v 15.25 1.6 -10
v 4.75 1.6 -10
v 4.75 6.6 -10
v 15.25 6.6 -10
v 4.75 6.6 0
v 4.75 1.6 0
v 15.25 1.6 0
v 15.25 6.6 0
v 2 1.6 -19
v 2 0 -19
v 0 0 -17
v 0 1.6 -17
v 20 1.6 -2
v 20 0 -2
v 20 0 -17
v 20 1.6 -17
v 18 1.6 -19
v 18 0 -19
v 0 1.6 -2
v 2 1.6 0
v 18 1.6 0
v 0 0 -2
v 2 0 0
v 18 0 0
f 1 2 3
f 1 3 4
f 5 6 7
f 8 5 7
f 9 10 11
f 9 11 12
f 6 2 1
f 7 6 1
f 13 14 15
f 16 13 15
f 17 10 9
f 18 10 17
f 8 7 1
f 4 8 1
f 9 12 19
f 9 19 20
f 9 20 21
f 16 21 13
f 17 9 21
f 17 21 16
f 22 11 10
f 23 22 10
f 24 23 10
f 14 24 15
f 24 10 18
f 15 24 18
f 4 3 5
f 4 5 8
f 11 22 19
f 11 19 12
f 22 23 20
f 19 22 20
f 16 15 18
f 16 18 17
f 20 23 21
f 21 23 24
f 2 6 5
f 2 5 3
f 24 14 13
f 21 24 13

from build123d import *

# Parameters (mm, degrees)
SKETCH1_W           = 20
SKETCH1_H           = 19
BOSS_EXTRUDE1_DEPTH = 1.6
CHAMFER1_SIZE       = 2
SKETCH2_W           = 10.5
SKETCH2_H           = 10
BOSS_EXTRUDE2_DEPTH = 5


with BuildPart() as part:
    # Sketch1 → Boss-Extrude1 (new body)
    with BuildSketch(Plane(origin=(0, 0, 0), x_dir=(1, 0, 0), z_dir=(0, 1, 0))):
        with Locations((10, 9.5)):
            Rectangle(SKETCH1_W, SKETCH1_H)
    extrude(amount=BOSS_EXTRUDE1_DEPTH)

    # Chamfer1
    chamfer1_edges = [part.edges().sort_by_distance(p)[0] for p in [
        (0, 0.8, -19),
        (20, 0.8, -19),
        (20, 0.8, 0),
        (0, 0.8, 0),
    ]]
    chamfer(chamfer1_edges, length=CHAMFER1_SIZE)


with BuildPart() as body_2:
    # Sketch2 → Boss-Extrude2 (new body)
    with BuildSketch(Plane(origin=(0, 1.6, 0), x_dir=(1, 0, 0), z_dir=(0, 1, 0))):
        with Locations((10, 5)):
            Rectangle(SKETCH2_W, SKETCH2_H)
    extrude(amount=BOSS_EXTRUDE2_DEPTH)


solid = Compound([part.part, body_2.part])
